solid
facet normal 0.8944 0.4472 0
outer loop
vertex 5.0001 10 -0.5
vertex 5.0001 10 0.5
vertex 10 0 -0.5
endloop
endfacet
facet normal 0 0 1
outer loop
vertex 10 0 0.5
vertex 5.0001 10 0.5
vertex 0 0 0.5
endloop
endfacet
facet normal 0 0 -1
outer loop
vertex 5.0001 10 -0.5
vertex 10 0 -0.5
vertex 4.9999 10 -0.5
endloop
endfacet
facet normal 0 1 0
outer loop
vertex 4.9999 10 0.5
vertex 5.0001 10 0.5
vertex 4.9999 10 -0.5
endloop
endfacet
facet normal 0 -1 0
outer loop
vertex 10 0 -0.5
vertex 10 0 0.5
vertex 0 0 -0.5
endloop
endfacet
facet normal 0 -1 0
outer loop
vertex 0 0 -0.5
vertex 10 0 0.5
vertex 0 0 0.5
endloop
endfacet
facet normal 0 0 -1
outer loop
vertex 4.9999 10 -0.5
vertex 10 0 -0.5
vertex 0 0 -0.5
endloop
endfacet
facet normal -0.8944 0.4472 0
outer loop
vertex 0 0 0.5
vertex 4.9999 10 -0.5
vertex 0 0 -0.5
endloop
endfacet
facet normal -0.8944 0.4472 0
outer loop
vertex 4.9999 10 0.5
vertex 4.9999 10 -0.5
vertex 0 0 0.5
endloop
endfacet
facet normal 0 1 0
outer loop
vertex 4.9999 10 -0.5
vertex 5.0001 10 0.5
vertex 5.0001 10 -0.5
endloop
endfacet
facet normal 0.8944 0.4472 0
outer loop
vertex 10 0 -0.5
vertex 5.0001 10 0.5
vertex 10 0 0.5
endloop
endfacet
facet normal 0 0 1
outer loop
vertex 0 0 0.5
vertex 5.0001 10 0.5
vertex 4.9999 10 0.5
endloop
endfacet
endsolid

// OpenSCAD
hull(){
    cube([.0001,.0001,1],center=true);
    translate([10,0,0])
    cube([.0001,.0001,1],center=true);
    translate([5,10,0])
    cube([.0001,.0001,1],center=true);
}
